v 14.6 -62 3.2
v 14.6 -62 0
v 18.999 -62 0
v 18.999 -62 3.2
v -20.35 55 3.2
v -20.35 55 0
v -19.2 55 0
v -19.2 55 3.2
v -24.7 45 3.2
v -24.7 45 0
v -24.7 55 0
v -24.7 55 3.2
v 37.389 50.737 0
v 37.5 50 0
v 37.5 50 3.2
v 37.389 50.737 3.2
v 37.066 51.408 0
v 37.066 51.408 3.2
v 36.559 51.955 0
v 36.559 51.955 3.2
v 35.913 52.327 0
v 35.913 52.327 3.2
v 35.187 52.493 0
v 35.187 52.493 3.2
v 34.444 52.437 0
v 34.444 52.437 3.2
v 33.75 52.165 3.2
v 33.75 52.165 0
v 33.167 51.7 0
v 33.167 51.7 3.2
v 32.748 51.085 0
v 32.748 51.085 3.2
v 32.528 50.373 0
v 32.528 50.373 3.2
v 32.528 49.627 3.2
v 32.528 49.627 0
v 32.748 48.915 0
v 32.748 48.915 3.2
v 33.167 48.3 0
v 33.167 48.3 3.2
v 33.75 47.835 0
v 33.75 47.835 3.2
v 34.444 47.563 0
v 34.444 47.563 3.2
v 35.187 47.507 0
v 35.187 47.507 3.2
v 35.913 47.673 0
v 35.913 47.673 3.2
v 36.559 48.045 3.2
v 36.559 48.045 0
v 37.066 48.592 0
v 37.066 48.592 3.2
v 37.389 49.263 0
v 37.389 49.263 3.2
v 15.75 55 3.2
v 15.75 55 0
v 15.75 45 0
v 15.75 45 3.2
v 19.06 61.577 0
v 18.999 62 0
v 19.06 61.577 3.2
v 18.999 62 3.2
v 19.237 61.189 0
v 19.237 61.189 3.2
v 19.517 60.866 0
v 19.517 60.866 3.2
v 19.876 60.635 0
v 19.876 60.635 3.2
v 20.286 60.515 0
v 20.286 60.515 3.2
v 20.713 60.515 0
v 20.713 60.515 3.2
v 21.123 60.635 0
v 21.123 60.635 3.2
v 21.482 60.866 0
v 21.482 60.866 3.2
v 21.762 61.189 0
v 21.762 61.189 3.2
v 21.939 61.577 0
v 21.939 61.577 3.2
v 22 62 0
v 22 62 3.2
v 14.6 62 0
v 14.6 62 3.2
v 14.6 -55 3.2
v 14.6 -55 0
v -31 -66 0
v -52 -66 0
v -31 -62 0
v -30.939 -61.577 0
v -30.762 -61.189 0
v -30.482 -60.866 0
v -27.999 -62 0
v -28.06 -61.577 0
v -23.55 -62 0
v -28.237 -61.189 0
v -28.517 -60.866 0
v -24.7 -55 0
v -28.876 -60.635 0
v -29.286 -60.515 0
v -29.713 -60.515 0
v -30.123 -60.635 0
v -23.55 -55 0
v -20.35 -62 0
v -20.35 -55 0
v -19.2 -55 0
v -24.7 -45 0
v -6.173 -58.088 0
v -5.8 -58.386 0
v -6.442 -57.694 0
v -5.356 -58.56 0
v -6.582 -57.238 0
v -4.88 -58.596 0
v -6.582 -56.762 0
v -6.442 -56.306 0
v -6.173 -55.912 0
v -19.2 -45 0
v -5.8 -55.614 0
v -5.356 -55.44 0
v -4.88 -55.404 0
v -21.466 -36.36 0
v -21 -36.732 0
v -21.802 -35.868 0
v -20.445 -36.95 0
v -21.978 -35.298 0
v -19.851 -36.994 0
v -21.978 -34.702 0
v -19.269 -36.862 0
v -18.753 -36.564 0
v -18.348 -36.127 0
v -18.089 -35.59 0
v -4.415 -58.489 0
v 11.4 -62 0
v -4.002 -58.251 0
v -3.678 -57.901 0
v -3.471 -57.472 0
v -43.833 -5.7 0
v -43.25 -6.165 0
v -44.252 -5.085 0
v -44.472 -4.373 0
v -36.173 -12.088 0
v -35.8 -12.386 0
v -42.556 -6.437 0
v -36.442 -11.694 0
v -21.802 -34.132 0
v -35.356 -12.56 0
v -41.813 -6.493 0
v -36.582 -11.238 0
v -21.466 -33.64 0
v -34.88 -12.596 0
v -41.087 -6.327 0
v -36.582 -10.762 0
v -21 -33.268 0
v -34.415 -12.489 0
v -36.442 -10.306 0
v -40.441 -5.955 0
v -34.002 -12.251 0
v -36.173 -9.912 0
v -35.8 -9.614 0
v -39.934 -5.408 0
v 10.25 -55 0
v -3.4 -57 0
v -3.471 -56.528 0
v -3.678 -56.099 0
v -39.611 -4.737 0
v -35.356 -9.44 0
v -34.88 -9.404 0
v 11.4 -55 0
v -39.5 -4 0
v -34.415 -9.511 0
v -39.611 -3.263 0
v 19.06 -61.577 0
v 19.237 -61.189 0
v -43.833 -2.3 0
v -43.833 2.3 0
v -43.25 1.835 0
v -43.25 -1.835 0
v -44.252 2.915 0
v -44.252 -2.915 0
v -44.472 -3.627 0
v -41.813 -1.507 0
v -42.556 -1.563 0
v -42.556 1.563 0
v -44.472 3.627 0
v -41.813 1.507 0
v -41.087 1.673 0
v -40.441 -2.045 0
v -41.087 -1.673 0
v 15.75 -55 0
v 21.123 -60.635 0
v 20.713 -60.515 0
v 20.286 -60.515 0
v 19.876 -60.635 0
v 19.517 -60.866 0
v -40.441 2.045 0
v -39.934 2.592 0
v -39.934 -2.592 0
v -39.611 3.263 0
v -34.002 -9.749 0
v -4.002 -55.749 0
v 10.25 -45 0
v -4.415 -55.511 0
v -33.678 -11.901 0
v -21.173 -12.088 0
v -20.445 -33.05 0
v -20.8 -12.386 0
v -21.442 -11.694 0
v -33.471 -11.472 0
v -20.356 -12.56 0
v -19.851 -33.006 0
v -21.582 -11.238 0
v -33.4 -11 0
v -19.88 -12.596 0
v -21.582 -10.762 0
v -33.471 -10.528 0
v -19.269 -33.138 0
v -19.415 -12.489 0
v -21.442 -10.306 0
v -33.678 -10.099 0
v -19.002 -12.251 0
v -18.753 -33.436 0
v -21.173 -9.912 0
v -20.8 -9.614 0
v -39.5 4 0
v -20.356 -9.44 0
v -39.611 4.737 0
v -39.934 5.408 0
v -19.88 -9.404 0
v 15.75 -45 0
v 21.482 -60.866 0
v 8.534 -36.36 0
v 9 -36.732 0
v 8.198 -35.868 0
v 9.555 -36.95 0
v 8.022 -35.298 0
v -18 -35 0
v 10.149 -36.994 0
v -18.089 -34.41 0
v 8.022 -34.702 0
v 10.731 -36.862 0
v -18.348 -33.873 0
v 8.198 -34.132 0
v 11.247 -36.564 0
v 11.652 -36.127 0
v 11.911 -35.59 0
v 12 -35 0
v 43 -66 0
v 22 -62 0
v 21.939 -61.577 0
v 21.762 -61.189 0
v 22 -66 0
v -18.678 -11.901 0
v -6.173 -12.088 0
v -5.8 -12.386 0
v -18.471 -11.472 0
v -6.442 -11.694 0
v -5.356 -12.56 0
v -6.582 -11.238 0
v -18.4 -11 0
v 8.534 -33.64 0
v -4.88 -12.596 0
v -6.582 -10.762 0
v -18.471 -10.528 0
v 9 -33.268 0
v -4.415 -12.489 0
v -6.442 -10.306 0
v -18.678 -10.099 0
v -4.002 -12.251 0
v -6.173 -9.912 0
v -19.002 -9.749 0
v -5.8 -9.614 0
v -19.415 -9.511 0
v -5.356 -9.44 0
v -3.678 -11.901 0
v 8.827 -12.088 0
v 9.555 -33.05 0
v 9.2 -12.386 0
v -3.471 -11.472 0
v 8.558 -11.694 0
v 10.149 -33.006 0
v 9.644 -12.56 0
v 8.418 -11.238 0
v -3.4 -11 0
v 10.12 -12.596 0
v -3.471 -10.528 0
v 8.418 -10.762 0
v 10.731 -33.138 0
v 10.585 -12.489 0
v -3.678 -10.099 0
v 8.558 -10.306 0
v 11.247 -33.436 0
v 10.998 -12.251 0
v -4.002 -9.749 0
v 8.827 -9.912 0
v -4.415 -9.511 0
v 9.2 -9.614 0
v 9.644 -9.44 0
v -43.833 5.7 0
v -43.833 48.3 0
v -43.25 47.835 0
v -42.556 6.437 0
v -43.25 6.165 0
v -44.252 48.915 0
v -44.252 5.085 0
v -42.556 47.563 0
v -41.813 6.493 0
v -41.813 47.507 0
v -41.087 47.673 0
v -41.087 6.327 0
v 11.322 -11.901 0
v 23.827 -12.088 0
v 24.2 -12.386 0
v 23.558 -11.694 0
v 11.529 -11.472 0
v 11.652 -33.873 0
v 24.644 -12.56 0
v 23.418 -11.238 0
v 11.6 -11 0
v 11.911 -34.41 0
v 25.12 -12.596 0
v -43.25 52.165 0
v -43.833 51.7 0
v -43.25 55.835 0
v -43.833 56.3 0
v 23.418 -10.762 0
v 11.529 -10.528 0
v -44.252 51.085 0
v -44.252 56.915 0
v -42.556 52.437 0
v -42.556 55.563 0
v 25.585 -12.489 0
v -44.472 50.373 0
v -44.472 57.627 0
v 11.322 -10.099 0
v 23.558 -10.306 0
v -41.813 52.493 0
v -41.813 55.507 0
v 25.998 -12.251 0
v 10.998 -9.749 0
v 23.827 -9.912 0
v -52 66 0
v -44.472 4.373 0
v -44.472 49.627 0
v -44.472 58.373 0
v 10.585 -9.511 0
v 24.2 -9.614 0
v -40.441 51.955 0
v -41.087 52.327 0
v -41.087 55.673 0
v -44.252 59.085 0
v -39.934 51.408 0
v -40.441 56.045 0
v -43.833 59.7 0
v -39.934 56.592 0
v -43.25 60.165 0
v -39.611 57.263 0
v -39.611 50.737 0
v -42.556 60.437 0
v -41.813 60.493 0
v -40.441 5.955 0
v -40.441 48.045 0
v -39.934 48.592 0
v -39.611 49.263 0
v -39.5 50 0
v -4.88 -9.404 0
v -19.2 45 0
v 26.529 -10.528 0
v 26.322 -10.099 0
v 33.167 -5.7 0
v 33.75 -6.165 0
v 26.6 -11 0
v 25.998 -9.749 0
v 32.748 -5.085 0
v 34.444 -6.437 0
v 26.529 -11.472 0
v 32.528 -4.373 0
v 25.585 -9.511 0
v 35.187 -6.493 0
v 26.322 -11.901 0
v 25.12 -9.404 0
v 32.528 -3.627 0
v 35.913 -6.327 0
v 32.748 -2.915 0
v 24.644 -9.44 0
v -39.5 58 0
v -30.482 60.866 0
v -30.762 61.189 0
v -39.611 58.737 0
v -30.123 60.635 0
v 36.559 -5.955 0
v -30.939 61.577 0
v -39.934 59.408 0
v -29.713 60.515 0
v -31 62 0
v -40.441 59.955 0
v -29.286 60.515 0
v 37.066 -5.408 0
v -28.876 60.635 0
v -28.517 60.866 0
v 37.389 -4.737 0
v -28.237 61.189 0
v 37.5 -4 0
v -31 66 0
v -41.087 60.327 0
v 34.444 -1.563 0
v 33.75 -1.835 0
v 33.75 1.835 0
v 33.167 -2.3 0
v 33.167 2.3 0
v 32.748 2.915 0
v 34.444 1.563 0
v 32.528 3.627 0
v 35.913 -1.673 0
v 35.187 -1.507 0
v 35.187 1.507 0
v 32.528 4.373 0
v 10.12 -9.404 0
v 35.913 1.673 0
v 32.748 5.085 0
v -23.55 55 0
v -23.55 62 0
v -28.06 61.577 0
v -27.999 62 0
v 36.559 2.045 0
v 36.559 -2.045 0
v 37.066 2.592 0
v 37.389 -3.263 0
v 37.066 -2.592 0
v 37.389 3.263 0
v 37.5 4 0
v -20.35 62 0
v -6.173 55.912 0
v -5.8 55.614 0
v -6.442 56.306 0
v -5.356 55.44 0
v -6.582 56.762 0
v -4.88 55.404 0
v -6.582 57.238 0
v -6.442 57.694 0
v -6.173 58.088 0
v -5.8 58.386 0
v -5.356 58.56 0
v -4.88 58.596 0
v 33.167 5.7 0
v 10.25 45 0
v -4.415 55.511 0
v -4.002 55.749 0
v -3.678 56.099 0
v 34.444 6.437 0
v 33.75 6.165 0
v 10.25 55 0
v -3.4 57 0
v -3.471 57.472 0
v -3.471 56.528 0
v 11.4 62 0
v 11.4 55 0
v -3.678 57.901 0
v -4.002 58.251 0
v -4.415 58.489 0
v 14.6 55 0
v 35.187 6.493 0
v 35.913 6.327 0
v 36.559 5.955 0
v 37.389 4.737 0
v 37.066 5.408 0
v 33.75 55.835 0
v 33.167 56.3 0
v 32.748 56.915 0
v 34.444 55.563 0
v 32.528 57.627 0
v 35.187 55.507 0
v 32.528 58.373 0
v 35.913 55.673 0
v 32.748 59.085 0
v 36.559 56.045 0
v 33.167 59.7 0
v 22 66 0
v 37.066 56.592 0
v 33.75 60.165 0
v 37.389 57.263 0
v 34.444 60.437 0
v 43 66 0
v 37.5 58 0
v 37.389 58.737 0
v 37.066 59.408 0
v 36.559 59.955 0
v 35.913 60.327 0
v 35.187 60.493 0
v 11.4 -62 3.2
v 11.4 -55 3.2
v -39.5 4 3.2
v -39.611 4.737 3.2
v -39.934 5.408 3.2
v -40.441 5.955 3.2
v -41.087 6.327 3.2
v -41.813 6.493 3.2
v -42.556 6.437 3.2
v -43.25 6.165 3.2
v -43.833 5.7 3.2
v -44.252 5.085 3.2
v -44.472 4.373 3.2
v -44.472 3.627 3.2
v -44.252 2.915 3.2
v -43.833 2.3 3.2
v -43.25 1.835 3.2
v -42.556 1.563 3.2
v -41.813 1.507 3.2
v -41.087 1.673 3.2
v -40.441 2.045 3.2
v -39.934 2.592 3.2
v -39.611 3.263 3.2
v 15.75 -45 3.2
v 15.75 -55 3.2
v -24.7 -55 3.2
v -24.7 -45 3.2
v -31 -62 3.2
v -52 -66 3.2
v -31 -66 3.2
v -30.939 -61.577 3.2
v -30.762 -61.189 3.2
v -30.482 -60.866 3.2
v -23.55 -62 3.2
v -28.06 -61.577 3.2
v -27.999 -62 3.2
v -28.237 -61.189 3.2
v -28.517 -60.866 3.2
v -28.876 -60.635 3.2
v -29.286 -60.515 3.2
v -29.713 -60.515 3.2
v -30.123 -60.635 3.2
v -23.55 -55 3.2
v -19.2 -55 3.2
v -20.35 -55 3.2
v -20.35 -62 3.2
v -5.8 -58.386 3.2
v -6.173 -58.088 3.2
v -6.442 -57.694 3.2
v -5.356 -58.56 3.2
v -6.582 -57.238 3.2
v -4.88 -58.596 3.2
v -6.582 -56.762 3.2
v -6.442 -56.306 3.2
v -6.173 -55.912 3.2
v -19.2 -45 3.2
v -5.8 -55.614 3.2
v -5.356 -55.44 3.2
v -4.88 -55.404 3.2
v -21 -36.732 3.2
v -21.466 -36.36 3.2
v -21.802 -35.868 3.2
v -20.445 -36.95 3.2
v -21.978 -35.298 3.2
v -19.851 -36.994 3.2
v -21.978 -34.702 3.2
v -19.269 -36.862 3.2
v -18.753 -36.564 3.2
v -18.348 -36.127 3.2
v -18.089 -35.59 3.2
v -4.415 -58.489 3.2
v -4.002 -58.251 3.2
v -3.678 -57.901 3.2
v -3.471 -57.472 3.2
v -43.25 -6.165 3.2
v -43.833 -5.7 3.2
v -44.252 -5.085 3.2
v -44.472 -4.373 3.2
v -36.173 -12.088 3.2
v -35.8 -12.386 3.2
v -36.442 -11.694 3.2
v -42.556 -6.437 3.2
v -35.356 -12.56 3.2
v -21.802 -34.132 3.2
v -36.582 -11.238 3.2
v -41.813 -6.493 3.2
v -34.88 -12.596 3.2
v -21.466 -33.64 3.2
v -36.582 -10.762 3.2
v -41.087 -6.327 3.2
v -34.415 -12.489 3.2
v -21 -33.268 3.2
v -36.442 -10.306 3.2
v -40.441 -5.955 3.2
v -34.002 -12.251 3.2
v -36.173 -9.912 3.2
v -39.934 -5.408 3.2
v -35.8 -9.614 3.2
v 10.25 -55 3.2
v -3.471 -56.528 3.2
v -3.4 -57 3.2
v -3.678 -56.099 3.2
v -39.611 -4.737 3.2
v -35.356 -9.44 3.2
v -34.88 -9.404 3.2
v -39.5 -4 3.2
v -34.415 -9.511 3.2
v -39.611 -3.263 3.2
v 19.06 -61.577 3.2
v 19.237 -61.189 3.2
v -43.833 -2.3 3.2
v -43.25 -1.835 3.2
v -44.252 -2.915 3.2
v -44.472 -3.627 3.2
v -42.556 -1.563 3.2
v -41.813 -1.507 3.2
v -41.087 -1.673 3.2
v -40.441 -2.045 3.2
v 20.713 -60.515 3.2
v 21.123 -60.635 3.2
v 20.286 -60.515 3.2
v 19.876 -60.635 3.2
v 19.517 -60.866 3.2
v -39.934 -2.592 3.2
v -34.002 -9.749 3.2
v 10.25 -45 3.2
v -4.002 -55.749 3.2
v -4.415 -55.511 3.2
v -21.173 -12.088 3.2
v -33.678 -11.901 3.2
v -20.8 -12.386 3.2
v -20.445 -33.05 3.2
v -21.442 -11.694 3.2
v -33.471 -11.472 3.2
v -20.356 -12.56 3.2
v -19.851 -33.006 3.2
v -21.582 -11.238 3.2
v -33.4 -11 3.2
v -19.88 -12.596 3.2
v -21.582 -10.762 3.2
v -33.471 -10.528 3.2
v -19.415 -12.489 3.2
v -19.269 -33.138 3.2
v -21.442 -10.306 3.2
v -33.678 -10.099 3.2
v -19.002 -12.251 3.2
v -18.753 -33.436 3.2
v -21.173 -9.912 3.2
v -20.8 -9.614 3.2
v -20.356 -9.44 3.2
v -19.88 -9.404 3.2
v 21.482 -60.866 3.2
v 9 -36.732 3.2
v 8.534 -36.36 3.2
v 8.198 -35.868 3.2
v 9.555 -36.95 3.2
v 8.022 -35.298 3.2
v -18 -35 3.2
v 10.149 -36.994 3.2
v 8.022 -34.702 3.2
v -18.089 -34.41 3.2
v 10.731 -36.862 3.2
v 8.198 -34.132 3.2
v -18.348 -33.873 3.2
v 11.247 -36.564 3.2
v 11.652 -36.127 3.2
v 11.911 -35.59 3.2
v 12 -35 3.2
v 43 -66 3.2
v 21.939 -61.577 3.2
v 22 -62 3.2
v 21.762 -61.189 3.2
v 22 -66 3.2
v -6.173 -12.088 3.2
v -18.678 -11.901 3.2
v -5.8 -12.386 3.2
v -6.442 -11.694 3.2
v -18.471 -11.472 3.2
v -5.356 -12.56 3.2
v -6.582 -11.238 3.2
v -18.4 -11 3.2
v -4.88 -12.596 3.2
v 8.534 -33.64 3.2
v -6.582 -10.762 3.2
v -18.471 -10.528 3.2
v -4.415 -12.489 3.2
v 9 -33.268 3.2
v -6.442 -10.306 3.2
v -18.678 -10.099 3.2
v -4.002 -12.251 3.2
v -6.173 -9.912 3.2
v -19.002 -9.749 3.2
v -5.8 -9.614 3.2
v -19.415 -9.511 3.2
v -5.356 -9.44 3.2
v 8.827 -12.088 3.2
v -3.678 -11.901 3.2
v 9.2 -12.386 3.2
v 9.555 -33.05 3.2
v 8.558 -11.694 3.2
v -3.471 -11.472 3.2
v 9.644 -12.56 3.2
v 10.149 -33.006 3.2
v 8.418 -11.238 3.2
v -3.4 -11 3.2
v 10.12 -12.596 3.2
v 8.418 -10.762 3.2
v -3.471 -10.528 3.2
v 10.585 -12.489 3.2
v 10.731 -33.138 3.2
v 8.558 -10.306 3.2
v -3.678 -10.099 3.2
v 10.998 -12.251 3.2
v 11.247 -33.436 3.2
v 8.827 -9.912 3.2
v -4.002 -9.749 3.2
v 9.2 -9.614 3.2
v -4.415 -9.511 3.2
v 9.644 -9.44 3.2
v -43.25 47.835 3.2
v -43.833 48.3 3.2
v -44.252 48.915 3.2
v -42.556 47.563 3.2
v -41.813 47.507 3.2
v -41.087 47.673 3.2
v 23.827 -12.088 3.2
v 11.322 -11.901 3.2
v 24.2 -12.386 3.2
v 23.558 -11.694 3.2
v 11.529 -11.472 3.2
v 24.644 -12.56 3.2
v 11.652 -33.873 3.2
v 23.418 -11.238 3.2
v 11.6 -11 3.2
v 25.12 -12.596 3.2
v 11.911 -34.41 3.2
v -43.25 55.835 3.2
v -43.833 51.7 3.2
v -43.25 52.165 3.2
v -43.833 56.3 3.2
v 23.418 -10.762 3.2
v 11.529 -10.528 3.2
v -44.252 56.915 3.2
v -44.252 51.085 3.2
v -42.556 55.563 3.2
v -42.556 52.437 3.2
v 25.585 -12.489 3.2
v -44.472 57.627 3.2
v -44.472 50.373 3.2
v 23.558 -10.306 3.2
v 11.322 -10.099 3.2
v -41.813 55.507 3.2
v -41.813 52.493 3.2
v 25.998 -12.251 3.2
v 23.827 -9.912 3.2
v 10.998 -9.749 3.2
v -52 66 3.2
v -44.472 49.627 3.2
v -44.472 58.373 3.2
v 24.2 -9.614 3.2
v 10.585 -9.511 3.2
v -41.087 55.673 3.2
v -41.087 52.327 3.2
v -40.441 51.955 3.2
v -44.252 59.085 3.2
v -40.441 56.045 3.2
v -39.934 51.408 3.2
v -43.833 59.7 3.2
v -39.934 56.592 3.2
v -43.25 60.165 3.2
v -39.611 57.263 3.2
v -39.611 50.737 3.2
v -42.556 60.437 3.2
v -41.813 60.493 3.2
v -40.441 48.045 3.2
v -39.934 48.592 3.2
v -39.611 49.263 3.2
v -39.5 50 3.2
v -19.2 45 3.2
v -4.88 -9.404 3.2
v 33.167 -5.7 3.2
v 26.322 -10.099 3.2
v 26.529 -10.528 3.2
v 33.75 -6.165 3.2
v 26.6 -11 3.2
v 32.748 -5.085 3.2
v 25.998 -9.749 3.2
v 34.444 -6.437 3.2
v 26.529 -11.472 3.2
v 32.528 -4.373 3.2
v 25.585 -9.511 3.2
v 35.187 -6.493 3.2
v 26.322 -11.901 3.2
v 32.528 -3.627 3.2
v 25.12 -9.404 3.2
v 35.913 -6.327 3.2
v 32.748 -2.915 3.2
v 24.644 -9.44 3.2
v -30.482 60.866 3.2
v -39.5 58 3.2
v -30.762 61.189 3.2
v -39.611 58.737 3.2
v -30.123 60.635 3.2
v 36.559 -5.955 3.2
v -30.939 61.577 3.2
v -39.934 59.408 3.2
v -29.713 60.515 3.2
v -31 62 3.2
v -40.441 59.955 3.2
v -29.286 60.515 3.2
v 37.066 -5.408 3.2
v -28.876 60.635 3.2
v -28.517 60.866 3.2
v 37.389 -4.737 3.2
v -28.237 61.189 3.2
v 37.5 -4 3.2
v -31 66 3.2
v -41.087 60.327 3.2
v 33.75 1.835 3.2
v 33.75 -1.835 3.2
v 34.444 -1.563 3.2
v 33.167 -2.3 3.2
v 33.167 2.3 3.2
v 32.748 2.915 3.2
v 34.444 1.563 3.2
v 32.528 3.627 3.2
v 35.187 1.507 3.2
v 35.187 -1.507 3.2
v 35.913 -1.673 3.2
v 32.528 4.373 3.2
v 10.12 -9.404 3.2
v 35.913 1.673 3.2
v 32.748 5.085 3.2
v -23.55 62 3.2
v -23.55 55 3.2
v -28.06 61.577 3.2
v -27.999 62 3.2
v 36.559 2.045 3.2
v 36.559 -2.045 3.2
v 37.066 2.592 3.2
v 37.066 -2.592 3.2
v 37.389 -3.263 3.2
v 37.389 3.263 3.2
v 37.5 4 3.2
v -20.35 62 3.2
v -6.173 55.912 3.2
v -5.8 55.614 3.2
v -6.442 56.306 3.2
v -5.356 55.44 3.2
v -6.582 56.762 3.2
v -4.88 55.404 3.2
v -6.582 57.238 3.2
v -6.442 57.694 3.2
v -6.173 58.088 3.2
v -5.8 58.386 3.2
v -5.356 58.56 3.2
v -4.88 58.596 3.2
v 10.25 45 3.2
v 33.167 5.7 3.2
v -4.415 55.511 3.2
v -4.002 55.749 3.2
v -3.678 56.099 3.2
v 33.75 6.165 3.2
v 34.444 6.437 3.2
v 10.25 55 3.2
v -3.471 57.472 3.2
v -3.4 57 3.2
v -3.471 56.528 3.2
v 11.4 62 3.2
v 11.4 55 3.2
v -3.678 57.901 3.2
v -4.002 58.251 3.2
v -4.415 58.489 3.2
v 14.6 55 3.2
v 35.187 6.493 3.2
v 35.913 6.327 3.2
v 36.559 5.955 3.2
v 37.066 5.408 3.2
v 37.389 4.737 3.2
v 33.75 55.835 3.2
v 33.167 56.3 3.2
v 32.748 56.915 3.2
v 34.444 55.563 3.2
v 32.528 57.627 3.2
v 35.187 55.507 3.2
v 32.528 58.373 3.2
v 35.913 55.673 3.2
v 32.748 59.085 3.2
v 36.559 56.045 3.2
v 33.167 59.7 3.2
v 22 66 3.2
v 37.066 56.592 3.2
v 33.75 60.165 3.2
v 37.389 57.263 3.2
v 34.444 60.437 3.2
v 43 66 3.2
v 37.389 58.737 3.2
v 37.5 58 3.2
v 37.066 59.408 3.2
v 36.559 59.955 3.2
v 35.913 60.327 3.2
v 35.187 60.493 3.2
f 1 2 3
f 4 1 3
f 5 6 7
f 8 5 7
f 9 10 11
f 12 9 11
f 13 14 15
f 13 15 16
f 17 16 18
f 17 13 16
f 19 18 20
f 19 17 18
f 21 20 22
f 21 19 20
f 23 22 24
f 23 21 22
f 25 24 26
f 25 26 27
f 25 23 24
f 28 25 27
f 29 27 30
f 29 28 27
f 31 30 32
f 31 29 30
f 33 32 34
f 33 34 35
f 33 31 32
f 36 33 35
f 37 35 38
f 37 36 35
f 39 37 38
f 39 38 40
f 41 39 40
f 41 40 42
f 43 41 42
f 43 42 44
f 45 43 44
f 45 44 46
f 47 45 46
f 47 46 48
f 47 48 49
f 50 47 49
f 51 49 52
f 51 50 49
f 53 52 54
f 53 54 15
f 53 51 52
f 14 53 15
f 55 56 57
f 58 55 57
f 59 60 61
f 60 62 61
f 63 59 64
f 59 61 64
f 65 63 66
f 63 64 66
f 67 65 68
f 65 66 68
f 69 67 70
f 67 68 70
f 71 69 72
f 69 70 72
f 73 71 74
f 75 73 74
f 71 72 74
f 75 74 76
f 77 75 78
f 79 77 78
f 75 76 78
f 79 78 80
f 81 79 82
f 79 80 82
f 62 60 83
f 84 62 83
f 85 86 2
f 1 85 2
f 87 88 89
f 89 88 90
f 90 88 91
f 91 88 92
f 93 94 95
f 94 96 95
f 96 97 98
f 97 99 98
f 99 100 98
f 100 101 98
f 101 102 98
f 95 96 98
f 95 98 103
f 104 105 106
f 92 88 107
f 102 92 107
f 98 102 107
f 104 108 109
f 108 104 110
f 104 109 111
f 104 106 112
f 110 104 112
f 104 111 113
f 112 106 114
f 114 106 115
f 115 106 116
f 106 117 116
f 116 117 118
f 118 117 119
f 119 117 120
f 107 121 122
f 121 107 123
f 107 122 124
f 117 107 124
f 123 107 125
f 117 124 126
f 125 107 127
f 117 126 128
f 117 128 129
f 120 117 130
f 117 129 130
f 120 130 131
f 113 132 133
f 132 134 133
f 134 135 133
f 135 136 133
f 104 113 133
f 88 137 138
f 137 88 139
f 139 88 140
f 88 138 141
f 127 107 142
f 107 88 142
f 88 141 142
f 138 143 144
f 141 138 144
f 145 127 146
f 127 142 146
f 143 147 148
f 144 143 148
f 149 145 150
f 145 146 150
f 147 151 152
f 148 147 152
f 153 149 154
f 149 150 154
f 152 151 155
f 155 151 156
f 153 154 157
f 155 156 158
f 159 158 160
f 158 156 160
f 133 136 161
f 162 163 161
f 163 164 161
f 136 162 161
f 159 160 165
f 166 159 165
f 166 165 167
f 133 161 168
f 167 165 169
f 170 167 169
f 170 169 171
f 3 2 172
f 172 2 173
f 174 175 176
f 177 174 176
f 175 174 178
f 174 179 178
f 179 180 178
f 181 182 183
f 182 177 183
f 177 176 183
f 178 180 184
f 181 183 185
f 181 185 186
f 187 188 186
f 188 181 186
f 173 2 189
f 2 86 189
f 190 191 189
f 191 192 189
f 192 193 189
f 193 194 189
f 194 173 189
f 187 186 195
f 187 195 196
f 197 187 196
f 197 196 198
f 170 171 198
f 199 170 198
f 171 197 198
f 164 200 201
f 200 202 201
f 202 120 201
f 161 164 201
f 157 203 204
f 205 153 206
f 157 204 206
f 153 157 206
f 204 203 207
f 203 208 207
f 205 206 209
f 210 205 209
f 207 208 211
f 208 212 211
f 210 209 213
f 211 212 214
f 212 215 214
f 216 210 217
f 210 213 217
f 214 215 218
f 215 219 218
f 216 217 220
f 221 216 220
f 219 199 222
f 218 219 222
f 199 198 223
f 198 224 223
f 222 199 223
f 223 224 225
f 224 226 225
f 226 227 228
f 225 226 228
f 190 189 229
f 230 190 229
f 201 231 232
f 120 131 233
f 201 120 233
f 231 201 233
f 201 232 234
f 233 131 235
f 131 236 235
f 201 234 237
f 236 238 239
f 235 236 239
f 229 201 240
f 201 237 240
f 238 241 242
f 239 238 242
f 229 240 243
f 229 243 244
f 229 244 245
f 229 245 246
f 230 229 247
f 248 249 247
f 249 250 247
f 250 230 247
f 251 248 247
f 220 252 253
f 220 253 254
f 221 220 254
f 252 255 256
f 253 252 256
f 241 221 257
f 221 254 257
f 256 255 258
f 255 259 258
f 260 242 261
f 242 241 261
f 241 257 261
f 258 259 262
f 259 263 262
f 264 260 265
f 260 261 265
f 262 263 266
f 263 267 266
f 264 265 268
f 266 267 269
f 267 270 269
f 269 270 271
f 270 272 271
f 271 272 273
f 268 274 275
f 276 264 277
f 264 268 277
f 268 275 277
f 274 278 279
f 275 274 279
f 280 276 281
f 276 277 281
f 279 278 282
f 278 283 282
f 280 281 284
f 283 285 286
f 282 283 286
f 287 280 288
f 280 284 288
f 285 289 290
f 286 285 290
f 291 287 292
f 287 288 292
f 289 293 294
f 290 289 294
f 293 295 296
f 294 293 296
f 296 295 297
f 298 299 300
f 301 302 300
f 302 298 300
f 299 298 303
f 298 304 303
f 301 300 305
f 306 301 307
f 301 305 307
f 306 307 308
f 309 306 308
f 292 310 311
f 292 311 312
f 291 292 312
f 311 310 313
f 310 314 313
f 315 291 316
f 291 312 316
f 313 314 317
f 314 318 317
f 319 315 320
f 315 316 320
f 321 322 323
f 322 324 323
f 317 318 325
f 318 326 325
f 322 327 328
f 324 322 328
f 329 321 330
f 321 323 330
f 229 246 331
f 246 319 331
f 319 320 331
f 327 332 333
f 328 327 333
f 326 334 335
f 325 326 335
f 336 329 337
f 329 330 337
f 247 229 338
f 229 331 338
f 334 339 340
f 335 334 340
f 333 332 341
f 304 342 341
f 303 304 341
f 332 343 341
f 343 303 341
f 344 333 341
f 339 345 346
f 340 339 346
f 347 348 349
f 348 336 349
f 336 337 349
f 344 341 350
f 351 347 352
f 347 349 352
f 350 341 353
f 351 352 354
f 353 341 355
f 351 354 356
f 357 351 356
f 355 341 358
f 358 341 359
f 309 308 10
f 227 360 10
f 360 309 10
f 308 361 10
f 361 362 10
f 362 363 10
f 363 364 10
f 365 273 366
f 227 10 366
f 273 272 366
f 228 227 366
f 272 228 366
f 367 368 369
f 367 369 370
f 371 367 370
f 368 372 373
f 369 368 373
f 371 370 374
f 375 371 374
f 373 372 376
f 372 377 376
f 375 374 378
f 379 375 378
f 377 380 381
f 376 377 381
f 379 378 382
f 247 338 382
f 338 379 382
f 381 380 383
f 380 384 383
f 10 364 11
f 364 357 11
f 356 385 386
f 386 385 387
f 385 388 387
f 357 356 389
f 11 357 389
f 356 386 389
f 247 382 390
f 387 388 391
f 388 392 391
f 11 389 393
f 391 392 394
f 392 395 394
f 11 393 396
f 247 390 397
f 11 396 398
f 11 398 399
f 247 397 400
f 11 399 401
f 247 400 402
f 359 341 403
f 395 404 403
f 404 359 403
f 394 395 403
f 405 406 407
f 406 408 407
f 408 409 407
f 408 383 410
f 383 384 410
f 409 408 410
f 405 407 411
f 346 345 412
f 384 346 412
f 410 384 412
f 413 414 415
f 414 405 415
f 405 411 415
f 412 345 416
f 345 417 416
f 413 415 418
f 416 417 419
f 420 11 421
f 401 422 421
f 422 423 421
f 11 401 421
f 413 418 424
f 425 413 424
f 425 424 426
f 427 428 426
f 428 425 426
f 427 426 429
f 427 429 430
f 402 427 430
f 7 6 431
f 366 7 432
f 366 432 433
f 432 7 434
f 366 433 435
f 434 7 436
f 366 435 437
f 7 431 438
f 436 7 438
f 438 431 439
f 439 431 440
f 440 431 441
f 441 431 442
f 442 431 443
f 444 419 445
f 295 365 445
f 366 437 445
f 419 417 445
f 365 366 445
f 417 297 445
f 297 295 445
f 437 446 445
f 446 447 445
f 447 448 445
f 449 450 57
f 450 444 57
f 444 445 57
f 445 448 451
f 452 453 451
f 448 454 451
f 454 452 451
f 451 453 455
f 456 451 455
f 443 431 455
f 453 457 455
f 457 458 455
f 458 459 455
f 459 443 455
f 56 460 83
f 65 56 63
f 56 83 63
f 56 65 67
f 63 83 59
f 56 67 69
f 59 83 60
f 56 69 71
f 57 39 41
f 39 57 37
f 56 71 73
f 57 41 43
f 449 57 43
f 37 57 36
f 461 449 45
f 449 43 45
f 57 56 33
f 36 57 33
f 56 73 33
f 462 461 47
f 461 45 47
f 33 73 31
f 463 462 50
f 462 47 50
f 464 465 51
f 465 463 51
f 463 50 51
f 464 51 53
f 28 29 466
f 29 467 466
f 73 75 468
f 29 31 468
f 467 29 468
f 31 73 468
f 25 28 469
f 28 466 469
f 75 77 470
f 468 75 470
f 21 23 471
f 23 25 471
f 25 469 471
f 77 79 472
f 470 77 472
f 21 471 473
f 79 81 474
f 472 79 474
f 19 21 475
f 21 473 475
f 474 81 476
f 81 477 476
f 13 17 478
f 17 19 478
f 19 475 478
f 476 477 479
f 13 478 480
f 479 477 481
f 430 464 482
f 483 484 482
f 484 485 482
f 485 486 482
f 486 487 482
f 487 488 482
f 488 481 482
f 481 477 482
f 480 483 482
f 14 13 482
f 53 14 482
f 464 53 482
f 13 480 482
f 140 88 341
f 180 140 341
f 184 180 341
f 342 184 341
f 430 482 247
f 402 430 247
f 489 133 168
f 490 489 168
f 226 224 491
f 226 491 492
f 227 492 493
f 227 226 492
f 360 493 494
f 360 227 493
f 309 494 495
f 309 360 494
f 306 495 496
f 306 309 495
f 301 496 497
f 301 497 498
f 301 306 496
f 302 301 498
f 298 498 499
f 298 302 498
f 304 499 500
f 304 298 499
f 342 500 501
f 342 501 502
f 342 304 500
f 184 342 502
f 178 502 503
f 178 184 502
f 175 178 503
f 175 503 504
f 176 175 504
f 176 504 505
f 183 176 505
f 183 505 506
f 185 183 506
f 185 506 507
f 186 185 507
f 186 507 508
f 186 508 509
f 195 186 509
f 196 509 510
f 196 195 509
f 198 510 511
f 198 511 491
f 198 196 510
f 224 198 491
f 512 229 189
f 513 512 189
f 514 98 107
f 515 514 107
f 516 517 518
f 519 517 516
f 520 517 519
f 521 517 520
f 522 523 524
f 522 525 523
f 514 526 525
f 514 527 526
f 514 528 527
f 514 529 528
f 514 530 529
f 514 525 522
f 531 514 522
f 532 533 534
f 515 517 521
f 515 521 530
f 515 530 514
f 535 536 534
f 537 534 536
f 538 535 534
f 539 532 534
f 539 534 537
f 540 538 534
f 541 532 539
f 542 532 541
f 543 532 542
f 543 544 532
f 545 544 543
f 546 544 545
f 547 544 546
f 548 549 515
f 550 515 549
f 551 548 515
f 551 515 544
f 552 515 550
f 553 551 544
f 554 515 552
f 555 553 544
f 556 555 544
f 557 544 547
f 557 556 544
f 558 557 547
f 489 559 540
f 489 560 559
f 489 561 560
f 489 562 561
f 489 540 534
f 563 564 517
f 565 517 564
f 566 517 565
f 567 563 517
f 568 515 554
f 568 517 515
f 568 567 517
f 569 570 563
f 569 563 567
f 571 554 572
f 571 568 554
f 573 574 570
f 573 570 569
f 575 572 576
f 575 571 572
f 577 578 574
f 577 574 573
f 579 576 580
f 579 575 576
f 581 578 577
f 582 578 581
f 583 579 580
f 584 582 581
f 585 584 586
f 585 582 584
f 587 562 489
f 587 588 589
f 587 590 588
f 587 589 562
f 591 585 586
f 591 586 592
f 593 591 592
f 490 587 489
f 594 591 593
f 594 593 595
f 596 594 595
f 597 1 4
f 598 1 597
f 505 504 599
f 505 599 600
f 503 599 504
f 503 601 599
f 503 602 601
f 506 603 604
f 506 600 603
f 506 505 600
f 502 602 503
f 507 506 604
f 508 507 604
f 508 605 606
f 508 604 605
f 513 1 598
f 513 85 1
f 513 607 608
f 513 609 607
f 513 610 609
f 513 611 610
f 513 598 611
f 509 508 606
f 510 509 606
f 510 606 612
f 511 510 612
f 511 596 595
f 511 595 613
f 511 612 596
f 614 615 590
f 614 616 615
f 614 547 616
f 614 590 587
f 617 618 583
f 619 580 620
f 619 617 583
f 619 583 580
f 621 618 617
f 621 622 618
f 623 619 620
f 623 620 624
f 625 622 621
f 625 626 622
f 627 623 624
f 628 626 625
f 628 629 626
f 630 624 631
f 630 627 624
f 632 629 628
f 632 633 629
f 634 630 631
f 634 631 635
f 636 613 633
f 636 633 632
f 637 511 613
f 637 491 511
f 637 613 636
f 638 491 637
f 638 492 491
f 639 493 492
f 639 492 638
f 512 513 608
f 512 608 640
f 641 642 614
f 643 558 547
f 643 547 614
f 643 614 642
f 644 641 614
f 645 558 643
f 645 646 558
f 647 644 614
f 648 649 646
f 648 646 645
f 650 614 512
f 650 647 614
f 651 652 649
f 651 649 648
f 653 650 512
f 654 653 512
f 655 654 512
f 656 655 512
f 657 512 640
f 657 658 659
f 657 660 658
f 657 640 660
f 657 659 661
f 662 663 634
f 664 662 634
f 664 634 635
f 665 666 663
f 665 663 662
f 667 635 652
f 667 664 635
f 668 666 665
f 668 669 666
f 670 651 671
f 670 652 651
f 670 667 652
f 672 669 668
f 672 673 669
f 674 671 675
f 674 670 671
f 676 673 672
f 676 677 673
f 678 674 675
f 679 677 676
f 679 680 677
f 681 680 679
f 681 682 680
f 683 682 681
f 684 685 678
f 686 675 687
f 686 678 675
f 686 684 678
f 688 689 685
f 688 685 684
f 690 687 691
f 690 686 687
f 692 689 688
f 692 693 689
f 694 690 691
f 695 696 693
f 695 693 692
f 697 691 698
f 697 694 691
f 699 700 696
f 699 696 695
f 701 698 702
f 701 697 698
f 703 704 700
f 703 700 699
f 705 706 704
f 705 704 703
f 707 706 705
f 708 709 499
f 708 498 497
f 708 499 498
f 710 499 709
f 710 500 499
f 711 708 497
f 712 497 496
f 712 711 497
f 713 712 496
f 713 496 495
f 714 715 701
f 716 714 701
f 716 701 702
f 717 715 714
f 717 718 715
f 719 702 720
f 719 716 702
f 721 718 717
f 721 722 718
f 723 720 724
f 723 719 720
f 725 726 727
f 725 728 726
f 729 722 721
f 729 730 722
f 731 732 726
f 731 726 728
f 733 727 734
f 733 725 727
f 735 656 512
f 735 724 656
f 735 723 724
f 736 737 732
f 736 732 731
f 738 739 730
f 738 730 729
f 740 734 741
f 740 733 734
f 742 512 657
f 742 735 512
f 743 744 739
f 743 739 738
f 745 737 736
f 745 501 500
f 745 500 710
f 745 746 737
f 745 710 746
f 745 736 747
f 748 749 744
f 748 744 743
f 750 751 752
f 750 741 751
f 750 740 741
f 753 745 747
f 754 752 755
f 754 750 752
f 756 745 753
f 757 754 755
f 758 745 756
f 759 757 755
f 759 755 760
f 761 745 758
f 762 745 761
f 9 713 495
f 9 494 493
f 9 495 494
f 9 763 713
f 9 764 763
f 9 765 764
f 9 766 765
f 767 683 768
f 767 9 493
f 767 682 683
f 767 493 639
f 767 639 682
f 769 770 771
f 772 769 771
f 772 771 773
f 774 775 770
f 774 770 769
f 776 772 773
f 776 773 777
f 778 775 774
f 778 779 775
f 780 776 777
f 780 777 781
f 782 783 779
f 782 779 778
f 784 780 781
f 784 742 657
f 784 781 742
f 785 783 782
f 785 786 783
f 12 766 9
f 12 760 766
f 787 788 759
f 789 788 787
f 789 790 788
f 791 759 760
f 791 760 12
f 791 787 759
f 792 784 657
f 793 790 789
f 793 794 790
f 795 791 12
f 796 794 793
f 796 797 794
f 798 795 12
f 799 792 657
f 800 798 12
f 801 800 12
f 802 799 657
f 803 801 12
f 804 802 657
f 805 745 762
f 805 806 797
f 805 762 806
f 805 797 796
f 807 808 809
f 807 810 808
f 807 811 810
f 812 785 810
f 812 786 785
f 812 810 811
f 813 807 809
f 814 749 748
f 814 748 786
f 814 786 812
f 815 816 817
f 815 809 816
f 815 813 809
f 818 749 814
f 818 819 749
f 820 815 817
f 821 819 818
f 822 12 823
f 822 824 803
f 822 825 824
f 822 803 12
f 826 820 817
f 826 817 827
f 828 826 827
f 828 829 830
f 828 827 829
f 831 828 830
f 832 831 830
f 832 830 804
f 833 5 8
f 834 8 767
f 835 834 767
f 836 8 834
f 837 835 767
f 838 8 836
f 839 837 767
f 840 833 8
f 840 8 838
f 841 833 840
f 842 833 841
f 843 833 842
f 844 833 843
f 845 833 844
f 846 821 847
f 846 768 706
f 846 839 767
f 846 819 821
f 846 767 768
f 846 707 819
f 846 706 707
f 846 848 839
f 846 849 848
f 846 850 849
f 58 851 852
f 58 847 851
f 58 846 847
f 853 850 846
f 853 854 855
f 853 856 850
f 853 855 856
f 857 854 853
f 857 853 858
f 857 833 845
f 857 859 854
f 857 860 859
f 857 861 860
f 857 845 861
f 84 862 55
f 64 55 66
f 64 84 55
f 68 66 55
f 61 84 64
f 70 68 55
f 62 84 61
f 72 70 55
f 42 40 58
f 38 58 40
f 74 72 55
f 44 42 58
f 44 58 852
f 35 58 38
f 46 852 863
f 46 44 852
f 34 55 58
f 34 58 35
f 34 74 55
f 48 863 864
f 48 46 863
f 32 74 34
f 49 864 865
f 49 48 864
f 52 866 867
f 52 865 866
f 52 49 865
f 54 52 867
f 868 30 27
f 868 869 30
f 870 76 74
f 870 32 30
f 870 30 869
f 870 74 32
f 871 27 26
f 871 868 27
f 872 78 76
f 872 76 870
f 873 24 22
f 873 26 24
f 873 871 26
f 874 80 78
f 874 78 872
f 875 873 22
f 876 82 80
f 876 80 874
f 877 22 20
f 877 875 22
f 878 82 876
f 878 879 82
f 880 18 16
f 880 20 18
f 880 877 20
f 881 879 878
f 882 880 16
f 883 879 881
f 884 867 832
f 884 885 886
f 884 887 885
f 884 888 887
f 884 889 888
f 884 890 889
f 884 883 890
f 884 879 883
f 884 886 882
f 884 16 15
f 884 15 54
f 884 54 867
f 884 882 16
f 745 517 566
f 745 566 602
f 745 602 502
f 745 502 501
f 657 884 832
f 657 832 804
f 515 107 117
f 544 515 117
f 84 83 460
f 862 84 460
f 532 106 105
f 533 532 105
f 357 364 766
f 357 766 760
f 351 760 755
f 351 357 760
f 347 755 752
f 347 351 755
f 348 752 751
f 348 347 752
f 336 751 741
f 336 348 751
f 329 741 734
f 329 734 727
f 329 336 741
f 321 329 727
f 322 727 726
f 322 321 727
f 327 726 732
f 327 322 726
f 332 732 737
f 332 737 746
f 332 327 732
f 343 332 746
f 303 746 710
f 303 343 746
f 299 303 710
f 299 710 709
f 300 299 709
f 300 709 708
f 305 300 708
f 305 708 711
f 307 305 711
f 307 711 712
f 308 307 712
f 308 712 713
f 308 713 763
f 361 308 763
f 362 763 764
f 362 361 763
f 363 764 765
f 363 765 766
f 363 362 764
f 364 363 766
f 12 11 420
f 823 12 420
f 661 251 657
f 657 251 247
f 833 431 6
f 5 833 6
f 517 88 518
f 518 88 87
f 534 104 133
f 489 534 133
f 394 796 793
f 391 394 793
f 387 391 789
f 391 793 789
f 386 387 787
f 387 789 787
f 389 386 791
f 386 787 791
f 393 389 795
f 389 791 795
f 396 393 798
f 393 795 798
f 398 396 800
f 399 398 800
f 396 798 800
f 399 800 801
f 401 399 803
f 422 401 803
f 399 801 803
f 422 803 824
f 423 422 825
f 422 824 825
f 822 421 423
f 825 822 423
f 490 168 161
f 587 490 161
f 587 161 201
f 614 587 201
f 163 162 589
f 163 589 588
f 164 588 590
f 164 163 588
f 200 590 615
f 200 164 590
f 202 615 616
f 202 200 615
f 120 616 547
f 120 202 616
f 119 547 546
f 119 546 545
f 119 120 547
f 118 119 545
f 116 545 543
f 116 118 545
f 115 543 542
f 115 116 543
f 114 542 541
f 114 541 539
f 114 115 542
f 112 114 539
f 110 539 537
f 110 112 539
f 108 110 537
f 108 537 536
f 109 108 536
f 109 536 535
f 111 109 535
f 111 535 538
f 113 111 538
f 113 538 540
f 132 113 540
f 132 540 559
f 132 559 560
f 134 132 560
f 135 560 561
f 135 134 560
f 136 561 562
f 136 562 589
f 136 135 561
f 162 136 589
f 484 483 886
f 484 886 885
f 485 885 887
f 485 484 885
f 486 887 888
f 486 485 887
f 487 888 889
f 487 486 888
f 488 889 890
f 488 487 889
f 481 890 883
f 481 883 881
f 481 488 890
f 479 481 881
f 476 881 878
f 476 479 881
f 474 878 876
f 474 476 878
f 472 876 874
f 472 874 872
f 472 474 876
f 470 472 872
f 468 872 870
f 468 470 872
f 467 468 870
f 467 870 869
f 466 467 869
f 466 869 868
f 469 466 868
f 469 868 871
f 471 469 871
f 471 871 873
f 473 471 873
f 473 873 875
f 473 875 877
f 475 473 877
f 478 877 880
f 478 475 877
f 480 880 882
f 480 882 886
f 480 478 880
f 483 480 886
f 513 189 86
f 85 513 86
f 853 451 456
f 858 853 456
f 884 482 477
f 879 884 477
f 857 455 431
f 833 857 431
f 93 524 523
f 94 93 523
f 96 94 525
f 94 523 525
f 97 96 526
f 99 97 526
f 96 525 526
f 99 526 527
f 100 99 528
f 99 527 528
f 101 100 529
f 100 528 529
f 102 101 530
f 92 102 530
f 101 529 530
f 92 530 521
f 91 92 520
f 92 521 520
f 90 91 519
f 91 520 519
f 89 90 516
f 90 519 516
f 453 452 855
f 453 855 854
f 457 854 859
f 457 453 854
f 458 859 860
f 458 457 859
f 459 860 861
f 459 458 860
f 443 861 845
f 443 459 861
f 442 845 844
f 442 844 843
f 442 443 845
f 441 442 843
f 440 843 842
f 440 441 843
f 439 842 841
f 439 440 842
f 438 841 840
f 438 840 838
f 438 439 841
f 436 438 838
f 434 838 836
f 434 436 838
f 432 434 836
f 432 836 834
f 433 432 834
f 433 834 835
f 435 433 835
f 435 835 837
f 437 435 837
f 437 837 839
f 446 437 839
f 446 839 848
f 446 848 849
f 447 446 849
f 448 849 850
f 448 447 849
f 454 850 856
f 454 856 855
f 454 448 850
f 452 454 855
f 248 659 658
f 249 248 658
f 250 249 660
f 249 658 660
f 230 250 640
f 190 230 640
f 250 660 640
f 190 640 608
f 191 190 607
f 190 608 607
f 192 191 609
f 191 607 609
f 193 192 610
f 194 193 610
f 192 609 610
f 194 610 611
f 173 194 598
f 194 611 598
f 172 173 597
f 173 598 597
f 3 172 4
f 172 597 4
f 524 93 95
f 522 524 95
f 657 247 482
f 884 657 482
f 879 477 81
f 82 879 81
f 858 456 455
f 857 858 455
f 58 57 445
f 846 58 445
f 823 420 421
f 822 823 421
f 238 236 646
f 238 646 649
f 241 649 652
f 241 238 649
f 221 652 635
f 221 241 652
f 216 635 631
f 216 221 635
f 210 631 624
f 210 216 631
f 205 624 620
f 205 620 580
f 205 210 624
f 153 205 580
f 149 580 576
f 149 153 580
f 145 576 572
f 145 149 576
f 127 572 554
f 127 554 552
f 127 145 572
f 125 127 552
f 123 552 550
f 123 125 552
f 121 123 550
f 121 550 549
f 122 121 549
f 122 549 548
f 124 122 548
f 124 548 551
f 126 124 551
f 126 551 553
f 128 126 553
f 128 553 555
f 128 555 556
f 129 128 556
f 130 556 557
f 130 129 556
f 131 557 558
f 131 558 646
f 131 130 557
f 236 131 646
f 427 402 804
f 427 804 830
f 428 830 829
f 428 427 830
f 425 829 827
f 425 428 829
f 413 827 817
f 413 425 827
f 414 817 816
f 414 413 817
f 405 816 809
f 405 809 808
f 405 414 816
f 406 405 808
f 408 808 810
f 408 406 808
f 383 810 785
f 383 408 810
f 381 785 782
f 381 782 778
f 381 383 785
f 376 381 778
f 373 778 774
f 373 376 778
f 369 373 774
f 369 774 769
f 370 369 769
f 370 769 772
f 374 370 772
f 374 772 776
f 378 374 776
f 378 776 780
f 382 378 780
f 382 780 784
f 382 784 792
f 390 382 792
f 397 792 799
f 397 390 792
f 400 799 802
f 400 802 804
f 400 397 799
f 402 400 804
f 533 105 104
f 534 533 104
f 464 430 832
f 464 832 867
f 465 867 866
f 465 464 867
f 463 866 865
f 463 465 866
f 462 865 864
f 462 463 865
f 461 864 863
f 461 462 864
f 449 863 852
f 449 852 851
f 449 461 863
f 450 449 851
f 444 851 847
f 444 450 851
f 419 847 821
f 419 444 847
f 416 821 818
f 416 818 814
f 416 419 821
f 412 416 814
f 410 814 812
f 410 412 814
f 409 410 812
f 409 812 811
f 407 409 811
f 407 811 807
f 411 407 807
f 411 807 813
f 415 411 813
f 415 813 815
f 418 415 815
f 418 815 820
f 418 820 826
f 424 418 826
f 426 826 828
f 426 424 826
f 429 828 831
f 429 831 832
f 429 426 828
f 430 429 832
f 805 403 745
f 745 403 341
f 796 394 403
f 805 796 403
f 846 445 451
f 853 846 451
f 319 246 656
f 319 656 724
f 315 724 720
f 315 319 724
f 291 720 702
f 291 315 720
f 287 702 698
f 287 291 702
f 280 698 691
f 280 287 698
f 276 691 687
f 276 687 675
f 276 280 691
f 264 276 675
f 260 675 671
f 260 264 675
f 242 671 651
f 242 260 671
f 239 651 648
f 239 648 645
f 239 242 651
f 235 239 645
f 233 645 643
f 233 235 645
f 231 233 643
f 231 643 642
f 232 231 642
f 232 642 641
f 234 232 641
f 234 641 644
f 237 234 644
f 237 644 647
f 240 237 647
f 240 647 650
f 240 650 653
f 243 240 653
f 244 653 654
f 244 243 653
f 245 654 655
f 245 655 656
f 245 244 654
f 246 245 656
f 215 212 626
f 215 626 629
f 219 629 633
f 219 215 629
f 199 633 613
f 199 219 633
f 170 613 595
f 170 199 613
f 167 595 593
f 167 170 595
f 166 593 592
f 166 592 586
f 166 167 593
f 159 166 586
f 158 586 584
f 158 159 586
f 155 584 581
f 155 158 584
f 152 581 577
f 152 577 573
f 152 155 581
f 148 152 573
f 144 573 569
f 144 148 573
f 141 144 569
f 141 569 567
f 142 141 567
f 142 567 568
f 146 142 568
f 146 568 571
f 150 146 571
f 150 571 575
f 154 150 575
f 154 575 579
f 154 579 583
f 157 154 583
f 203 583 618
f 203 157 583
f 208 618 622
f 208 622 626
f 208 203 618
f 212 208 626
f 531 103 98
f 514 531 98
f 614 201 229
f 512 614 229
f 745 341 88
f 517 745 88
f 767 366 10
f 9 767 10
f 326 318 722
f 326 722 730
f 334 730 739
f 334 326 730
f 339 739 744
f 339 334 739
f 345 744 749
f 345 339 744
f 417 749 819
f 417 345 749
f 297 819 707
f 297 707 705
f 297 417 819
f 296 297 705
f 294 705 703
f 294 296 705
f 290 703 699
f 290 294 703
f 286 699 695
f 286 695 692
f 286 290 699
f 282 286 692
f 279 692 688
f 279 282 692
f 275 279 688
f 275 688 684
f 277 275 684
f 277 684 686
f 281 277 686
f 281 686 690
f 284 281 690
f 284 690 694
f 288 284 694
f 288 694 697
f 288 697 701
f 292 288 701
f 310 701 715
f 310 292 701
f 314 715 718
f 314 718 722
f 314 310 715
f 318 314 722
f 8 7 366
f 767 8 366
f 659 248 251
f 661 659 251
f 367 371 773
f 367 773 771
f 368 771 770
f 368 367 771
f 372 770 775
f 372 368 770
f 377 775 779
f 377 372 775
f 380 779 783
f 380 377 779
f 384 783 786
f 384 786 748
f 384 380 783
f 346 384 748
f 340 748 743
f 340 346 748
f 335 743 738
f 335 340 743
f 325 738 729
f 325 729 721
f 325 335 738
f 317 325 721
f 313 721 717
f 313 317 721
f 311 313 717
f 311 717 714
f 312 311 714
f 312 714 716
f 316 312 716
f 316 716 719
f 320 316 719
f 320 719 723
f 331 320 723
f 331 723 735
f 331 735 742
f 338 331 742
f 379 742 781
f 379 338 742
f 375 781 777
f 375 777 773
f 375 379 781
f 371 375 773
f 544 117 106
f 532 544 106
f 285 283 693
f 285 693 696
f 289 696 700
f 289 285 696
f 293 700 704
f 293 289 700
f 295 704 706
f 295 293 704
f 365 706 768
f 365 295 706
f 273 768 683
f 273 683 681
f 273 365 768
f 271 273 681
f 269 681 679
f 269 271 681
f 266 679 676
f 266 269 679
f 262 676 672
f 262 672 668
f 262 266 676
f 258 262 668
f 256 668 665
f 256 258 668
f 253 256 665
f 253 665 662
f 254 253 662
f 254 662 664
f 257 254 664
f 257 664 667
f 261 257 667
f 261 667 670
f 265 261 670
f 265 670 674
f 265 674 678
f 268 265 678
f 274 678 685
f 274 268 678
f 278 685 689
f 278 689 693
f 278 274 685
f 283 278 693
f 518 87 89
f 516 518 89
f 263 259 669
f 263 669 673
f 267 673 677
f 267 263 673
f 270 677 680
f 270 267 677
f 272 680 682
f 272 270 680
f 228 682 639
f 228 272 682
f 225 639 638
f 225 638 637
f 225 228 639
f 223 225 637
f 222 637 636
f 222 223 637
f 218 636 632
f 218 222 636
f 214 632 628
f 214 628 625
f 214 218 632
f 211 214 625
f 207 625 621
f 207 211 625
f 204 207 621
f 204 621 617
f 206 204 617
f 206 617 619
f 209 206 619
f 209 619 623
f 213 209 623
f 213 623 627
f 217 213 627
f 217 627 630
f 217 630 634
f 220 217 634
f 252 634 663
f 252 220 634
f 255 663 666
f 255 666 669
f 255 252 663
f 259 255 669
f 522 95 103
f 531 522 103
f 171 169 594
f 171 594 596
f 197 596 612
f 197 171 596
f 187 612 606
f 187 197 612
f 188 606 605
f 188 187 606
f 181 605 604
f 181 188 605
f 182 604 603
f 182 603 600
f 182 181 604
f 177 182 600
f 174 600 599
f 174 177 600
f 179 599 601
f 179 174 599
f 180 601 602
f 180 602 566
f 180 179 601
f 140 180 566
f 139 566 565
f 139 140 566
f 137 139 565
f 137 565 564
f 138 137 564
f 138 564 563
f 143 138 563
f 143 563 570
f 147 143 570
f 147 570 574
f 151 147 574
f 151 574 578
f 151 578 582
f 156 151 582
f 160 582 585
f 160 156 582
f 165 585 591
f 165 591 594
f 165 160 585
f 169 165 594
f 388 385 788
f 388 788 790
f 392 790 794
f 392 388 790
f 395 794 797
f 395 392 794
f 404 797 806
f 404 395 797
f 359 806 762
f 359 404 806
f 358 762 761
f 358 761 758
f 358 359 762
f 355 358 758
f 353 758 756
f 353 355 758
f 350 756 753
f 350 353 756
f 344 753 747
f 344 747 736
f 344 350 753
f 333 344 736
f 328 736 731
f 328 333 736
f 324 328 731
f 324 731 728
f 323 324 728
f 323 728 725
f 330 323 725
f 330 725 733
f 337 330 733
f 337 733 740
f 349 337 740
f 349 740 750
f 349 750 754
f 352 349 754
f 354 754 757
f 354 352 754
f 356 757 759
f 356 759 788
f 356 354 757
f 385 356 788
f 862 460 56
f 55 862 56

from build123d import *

# Parameters (mm, degrees)
MODEL_R             = 2.5
MODEL_R_2           = 2
MODEL_R_3           = 1.6
BOSS_EXTRUDE1_DEPTH = 3.2
SKETCH1_R           = 1.5005
CUT_EXTRUDE1_DEPTH  = 85.084719183


with BuildPart() as part:
    # Model → Boss-Extrude1 (new body)
    with BuildSketch(Plane.XY):
        Polygon((15.75, 55), (15.75, 45), (10.25, 45), (10.25, 55), (11.4, 55), (11.4, 62), (-20.35, 62), (-20.35, 55), (-19.2, 55), (-19.2, 45), (-24.7, 45), (-24.7, 55), (-23.55, 55), (-23.55, 62), (-31, 62), (-31, 66), (-52, 66), (-52, -66), (-31, -66), (-31, -62), (-23.55, -62), (-23.55, -55), (-24.7, -55), (-24.7, -45), (-19.2, -45), (-19.2, -55), (-20.35, -55), (-20.35, -62), (11.4, -62), (11.4, -55), (10.25, -55), (10.25, -45), (15.75, -45), (15.75, -55), (14.6, -55), (14.6, -62), (22, -62), (22, -66), (43, -66), (43, 66), (22, 66), (22, 62), (14.6, 62), (14.6, 55), align=None)
        with Locations((-42, -4)):
            Circle(MODEL_R, mode=Mode.SUBTRACT)
        with Locations((-42, 58)):
            Circle(MODEL_R, mode=Mode.SUBTRACT)
        with Locations((35, 50)):
            Circle(MODEL_R, mode=Mode.SUBTRACT)
        with Locations((35, -4)):
            Circle(MODEL_R, mode=Mode.SUBTRACT)
        with Locations((35, 58)):
            Circle(MODEL_R, mode=Mode.SUBTRACT)
        with Locations((35, 4)):
            Circle(MODEL_R, mode=Mode.SUBTRACT)
        with Locations((-42, 4)):
            Circle(MODEL_R, mode=Mode.SUBTRACT)
        with Locations((-42, 50)):
            Circle(MODEL_R, mode=Mode.SUBTRACT)
        with Locations((-20, -35)):
            Circle(MODEL_R_2, mode=Mode.SUBTRACT)
        with Locations((10, -35)):
            Circle(MODEL_R_2, mode=Mode.SUBTRACT)
        with Locations((10, -11)):
            Circle(MODEL_R_3, mode=Mode.SUBTRACT)
        with Locations((25, -11)):
            Circle(MODEL_R_3, mode=Mode.SUBTRACT)
        with Locations((-5, 57)):
            Circle(MODEL_R_3, mode=Mode.SUBTRACT)
        with Locations((-5, -57)):
            Circle(MODEL_R_3, mode=Mode.SUBTRACT)
        with Locations((-35, -11)):
            Circle(MODEL_R_3, mode=Mode.SUBTRACT)
        with Locations((-20, -11)):
            Circle(MODEL_R_3, mode=Mode.SUBTRACT)
        with Locations((-5, -11)):
            Circle(MODEL_R_3, mode=Mode.SUBTRACT)
    extrude(amount=BOSS_EXTRUDE1_DEPTH)

    # Sketch1 → Cut-Extrude1 (cut, through all)
    with BuildSketch(Plane.XY.offset(3.2)):
        with Locations((-29.4995, 62)):
            Circle(SKETCH1_R)
        with Locations((20.4995, 62)):
            Circle(SKETCH1_R)
        with Locations((20.4995, -62)):
            Circle(SKETCH1_R)
        with Locations((-29.4995, -62)):
            Circle(SKETCH1_R)
    extrude(amount=-CUT_EXTRUDE1_DEPTH, mode=Mode.SUBTRACT)


solid = part.part
